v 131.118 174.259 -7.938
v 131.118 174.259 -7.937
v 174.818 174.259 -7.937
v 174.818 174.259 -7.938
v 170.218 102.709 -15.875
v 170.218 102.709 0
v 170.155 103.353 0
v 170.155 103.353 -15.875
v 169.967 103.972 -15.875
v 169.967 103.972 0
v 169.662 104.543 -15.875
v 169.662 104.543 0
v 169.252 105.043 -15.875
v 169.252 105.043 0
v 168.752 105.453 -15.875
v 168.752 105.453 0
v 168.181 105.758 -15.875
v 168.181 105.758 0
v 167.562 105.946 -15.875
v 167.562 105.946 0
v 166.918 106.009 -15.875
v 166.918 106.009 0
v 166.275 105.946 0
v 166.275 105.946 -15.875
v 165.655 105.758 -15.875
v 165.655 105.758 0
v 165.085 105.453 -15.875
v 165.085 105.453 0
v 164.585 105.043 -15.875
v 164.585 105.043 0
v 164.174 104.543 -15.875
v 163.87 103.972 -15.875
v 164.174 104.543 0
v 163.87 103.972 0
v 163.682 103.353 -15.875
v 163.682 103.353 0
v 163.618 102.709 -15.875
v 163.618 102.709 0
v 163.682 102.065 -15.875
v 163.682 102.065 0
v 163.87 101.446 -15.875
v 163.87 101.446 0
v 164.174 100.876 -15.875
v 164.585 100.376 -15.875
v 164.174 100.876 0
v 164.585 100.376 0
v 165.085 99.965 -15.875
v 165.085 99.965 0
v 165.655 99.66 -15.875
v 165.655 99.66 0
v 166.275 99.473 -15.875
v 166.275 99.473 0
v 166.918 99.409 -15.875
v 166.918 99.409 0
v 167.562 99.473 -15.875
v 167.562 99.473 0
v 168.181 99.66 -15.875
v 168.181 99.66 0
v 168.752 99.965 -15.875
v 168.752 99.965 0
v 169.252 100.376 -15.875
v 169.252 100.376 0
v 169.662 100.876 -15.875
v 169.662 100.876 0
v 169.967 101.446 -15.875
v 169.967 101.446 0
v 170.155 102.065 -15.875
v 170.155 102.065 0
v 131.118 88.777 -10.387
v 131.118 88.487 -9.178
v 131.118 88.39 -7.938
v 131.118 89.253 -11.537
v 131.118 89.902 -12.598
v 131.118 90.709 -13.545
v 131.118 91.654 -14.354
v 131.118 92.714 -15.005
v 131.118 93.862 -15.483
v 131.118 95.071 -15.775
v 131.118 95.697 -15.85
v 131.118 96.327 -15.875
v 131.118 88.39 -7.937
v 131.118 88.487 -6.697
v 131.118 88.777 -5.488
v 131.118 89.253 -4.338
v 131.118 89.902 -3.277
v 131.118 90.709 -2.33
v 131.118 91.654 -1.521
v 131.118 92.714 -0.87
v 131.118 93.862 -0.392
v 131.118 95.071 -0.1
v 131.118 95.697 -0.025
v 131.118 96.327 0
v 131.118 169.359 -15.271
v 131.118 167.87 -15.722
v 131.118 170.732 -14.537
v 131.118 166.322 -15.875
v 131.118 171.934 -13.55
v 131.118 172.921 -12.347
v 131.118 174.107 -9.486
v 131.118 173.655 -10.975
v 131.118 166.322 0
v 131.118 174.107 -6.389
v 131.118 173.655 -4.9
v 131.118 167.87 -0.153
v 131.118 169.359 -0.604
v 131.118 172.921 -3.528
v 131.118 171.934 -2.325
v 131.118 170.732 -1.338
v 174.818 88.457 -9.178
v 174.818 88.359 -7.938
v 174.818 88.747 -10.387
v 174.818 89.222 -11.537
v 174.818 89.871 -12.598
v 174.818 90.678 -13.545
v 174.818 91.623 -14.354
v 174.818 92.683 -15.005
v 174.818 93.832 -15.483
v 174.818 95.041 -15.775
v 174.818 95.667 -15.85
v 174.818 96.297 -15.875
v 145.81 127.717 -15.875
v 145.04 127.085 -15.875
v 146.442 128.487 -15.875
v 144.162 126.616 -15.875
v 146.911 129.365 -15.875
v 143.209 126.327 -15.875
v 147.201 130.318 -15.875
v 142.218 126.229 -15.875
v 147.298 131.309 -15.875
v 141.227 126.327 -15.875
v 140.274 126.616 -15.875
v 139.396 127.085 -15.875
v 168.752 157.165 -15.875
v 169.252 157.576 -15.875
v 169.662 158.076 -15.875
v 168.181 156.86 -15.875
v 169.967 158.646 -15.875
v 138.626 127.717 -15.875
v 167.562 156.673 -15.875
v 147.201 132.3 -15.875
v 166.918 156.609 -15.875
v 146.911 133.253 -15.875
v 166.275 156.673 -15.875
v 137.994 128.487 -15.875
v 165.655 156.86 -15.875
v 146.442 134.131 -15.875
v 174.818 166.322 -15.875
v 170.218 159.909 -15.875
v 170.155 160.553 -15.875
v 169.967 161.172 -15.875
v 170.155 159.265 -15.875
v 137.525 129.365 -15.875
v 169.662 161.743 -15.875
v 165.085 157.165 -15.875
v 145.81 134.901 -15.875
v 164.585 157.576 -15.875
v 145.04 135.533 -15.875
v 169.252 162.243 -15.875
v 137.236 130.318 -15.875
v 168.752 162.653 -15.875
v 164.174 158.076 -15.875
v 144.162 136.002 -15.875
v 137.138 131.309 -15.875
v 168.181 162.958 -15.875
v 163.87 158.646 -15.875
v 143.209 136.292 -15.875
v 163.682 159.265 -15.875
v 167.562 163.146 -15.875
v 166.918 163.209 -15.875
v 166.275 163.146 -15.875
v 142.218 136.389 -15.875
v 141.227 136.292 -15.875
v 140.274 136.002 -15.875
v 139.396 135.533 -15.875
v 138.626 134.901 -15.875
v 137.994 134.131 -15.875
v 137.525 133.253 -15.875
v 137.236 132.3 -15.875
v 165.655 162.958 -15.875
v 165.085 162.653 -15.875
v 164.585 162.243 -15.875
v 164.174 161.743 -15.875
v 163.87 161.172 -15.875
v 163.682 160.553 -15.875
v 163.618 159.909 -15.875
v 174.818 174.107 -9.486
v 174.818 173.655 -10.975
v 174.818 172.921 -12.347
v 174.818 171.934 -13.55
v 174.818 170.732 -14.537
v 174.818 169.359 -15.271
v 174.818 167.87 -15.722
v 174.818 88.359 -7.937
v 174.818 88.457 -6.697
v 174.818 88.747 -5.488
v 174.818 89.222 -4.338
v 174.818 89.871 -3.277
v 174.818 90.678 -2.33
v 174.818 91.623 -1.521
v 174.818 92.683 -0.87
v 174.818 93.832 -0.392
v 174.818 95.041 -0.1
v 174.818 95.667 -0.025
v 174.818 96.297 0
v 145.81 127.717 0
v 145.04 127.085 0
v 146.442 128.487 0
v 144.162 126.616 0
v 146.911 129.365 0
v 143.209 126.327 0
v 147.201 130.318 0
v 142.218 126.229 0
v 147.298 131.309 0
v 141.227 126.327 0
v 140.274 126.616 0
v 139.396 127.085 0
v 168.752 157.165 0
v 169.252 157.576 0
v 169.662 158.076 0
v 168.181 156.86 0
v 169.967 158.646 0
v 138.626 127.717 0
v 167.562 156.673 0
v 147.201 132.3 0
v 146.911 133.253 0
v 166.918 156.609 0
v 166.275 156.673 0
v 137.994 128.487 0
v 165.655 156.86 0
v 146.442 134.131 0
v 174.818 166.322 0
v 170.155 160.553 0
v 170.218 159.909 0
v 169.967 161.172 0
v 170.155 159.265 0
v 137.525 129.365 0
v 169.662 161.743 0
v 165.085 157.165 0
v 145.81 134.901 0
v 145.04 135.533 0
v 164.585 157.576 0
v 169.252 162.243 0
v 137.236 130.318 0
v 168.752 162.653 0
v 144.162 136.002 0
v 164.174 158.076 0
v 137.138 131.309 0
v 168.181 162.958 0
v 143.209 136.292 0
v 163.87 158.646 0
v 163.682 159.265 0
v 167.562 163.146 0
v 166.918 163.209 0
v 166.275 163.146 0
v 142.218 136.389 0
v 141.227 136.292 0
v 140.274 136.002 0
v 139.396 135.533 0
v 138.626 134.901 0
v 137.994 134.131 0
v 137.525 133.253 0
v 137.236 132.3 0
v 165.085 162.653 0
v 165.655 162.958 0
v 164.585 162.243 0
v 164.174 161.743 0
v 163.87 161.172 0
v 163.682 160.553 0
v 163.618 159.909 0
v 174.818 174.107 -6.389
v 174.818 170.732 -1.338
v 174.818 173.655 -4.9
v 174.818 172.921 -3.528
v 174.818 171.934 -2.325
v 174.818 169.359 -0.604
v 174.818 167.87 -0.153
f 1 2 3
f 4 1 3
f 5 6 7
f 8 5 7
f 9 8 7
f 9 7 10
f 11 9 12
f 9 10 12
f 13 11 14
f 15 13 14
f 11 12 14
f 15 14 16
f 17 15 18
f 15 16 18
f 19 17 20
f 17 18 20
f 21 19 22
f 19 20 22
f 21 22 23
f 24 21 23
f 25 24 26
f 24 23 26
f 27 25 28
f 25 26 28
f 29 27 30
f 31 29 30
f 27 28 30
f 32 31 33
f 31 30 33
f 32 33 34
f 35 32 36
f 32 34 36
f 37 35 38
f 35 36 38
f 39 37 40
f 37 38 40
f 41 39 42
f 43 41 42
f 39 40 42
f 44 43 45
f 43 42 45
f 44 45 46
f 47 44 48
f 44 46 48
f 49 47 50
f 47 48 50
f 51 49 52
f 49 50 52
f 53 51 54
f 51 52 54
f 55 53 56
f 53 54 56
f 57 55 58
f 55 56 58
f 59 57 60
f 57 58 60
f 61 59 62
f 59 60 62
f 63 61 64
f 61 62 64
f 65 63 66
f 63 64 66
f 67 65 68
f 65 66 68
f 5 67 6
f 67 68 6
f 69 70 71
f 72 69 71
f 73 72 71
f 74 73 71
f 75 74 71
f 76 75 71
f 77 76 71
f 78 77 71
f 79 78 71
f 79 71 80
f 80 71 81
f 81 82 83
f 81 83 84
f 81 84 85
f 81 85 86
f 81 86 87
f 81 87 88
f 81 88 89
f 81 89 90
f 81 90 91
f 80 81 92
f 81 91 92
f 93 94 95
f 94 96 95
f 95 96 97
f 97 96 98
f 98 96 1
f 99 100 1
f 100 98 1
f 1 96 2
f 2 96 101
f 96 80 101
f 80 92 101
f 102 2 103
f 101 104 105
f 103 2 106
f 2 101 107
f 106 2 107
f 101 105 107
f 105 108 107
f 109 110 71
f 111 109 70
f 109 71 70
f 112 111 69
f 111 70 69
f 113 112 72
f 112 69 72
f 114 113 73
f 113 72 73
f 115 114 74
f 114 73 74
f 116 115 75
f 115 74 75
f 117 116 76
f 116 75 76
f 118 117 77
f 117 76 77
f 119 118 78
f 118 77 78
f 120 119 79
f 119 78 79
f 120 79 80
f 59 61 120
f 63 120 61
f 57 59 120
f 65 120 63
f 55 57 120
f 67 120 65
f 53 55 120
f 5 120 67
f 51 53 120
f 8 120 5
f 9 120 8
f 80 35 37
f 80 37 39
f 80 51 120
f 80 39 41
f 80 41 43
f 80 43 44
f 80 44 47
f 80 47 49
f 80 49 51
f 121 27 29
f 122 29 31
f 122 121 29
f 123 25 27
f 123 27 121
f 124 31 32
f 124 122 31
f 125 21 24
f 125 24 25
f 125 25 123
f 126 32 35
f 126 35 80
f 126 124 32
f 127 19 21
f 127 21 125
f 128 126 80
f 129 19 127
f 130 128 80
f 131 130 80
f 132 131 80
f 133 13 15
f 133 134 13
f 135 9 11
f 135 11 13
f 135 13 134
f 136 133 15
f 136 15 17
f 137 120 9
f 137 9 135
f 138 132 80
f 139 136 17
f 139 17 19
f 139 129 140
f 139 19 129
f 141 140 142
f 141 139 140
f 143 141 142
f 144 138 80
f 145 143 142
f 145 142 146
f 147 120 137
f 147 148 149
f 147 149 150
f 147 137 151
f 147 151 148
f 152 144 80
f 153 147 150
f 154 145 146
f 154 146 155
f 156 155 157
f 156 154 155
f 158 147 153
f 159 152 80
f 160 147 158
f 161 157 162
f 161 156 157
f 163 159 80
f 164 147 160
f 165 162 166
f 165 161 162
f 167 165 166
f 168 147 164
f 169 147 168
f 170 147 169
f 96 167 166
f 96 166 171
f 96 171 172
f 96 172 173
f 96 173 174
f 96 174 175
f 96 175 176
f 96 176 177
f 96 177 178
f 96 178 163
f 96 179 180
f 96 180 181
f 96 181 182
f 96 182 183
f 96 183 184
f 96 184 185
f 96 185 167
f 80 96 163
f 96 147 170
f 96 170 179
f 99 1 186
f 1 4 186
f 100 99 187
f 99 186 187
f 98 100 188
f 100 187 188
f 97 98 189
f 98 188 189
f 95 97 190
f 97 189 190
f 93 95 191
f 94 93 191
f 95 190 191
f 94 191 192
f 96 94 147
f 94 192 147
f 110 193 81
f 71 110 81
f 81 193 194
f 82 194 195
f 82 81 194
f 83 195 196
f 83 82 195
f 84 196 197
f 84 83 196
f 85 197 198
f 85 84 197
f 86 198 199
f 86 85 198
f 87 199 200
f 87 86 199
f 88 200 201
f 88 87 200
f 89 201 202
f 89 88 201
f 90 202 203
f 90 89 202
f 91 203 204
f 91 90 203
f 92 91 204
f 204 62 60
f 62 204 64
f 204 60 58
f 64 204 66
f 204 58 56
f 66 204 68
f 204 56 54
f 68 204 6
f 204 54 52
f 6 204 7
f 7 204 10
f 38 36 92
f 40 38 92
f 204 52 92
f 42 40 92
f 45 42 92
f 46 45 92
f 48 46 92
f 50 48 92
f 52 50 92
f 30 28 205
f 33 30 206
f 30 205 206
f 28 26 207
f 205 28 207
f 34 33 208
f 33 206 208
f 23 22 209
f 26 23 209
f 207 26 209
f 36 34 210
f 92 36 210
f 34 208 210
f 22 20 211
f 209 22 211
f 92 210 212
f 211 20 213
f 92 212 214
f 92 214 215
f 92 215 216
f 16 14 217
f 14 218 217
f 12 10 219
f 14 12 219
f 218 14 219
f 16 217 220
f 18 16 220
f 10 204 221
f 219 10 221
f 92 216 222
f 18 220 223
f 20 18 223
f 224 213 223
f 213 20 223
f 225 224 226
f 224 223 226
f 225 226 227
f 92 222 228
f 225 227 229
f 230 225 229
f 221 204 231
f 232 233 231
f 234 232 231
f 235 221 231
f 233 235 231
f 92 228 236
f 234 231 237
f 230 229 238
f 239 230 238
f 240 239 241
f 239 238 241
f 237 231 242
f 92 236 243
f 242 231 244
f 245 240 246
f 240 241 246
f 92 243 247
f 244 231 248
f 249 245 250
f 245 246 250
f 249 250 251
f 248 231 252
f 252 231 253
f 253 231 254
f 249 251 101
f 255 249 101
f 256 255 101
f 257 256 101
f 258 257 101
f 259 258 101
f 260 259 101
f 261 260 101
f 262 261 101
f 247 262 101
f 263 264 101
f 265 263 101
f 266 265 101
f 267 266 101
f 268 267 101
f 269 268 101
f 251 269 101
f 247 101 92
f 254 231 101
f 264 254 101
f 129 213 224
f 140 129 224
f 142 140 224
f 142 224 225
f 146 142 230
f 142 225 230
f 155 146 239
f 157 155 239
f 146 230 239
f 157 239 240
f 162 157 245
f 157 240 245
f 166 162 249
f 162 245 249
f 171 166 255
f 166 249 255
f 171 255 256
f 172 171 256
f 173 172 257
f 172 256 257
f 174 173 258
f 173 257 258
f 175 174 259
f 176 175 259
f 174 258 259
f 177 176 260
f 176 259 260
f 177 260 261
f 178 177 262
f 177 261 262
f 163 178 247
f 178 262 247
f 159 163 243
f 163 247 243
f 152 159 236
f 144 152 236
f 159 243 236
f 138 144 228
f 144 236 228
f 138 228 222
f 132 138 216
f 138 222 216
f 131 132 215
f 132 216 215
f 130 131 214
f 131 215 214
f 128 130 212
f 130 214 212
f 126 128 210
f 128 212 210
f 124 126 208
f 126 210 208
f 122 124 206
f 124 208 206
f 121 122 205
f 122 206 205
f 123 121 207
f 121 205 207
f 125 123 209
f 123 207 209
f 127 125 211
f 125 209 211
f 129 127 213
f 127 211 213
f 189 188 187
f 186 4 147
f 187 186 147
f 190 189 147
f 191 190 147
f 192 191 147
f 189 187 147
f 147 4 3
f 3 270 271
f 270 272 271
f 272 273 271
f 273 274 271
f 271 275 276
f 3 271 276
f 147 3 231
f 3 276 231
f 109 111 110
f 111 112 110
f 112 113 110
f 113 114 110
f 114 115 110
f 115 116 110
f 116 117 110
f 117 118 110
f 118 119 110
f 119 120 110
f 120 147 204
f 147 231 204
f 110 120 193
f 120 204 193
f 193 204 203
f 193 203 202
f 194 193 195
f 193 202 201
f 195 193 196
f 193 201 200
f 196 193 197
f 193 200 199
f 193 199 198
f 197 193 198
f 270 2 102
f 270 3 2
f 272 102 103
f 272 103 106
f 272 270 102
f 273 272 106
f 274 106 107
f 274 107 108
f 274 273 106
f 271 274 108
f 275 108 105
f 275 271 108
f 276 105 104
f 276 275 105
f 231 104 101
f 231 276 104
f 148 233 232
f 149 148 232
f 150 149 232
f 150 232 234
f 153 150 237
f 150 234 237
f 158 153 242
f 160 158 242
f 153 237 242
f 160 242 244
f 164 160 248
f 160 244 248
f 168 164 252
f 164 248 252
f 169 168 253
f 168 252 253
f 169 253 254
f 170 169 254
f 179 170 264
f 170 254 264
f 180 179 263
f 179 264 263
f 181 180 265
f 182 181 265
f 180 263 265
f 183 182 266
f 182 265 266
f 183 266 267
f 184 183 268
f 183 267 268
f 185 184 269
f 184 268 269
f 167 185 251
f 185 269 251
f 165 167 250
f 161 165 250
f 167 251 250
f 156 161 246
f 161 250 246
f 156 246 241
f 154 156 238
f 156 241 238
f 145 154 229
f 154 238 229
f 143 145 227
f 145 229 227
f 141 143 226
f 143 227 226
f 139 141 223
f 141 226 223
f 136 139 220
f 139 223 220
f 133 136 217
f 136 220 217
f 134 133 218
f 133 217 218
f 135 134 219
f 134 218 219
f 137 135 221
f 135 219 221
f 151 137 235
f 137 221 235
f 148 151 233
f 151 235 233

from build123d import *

# Parameters (mm, degrees)
SKETCH1_R      = 3.3000188
SKETCH1_R_2    = 5.08
EXTRUDE1_DEPTH = 15.875
FILLET1_R      = 7.9375


with BuildPart() as part:
    # Sketch1 → Extrude1 (new body)
    with BuildSketch(Plane.XY):
        Polygon((174.8183702, 88.3592086), (131.1183814, 88.3896378), (131.1183814, 174.2591892), (174.8183702, 174.2591892), align=None)
        with Locations((166.9183606, 159.9092052)):
            Circle(SKETCH1_R, mode=Mode.SUBTRACT)
        with Locations((166.9183606, 102.7091926)):
            Circle(SKETCH1_R, mode=Mode.SUBTRACT)
        with Locations((142.2181814, 131.3091862)):
            Circle(SKETCH1_R_2, mode=Mode.SUBTRACT)
    extrude(amount=-EXTRUDE1_DEPTH)

    # Fillet1
    fillet1_edges = [part.edges().sort_by_distance(p)[0] for p in [
        (152.9683758, 88.3744232, -15.875),
        (152.9683758, 88.3744232, 0),
        (152.9683758, 174.2591892, -15.875),
        (152.9683758, 174.2591892, 0),
    ]]
    fillet(fillet1_edges, radius=FILLET1_R - 0.0001)  # a hair under: the kernel refuses the full size


solid = part.part
